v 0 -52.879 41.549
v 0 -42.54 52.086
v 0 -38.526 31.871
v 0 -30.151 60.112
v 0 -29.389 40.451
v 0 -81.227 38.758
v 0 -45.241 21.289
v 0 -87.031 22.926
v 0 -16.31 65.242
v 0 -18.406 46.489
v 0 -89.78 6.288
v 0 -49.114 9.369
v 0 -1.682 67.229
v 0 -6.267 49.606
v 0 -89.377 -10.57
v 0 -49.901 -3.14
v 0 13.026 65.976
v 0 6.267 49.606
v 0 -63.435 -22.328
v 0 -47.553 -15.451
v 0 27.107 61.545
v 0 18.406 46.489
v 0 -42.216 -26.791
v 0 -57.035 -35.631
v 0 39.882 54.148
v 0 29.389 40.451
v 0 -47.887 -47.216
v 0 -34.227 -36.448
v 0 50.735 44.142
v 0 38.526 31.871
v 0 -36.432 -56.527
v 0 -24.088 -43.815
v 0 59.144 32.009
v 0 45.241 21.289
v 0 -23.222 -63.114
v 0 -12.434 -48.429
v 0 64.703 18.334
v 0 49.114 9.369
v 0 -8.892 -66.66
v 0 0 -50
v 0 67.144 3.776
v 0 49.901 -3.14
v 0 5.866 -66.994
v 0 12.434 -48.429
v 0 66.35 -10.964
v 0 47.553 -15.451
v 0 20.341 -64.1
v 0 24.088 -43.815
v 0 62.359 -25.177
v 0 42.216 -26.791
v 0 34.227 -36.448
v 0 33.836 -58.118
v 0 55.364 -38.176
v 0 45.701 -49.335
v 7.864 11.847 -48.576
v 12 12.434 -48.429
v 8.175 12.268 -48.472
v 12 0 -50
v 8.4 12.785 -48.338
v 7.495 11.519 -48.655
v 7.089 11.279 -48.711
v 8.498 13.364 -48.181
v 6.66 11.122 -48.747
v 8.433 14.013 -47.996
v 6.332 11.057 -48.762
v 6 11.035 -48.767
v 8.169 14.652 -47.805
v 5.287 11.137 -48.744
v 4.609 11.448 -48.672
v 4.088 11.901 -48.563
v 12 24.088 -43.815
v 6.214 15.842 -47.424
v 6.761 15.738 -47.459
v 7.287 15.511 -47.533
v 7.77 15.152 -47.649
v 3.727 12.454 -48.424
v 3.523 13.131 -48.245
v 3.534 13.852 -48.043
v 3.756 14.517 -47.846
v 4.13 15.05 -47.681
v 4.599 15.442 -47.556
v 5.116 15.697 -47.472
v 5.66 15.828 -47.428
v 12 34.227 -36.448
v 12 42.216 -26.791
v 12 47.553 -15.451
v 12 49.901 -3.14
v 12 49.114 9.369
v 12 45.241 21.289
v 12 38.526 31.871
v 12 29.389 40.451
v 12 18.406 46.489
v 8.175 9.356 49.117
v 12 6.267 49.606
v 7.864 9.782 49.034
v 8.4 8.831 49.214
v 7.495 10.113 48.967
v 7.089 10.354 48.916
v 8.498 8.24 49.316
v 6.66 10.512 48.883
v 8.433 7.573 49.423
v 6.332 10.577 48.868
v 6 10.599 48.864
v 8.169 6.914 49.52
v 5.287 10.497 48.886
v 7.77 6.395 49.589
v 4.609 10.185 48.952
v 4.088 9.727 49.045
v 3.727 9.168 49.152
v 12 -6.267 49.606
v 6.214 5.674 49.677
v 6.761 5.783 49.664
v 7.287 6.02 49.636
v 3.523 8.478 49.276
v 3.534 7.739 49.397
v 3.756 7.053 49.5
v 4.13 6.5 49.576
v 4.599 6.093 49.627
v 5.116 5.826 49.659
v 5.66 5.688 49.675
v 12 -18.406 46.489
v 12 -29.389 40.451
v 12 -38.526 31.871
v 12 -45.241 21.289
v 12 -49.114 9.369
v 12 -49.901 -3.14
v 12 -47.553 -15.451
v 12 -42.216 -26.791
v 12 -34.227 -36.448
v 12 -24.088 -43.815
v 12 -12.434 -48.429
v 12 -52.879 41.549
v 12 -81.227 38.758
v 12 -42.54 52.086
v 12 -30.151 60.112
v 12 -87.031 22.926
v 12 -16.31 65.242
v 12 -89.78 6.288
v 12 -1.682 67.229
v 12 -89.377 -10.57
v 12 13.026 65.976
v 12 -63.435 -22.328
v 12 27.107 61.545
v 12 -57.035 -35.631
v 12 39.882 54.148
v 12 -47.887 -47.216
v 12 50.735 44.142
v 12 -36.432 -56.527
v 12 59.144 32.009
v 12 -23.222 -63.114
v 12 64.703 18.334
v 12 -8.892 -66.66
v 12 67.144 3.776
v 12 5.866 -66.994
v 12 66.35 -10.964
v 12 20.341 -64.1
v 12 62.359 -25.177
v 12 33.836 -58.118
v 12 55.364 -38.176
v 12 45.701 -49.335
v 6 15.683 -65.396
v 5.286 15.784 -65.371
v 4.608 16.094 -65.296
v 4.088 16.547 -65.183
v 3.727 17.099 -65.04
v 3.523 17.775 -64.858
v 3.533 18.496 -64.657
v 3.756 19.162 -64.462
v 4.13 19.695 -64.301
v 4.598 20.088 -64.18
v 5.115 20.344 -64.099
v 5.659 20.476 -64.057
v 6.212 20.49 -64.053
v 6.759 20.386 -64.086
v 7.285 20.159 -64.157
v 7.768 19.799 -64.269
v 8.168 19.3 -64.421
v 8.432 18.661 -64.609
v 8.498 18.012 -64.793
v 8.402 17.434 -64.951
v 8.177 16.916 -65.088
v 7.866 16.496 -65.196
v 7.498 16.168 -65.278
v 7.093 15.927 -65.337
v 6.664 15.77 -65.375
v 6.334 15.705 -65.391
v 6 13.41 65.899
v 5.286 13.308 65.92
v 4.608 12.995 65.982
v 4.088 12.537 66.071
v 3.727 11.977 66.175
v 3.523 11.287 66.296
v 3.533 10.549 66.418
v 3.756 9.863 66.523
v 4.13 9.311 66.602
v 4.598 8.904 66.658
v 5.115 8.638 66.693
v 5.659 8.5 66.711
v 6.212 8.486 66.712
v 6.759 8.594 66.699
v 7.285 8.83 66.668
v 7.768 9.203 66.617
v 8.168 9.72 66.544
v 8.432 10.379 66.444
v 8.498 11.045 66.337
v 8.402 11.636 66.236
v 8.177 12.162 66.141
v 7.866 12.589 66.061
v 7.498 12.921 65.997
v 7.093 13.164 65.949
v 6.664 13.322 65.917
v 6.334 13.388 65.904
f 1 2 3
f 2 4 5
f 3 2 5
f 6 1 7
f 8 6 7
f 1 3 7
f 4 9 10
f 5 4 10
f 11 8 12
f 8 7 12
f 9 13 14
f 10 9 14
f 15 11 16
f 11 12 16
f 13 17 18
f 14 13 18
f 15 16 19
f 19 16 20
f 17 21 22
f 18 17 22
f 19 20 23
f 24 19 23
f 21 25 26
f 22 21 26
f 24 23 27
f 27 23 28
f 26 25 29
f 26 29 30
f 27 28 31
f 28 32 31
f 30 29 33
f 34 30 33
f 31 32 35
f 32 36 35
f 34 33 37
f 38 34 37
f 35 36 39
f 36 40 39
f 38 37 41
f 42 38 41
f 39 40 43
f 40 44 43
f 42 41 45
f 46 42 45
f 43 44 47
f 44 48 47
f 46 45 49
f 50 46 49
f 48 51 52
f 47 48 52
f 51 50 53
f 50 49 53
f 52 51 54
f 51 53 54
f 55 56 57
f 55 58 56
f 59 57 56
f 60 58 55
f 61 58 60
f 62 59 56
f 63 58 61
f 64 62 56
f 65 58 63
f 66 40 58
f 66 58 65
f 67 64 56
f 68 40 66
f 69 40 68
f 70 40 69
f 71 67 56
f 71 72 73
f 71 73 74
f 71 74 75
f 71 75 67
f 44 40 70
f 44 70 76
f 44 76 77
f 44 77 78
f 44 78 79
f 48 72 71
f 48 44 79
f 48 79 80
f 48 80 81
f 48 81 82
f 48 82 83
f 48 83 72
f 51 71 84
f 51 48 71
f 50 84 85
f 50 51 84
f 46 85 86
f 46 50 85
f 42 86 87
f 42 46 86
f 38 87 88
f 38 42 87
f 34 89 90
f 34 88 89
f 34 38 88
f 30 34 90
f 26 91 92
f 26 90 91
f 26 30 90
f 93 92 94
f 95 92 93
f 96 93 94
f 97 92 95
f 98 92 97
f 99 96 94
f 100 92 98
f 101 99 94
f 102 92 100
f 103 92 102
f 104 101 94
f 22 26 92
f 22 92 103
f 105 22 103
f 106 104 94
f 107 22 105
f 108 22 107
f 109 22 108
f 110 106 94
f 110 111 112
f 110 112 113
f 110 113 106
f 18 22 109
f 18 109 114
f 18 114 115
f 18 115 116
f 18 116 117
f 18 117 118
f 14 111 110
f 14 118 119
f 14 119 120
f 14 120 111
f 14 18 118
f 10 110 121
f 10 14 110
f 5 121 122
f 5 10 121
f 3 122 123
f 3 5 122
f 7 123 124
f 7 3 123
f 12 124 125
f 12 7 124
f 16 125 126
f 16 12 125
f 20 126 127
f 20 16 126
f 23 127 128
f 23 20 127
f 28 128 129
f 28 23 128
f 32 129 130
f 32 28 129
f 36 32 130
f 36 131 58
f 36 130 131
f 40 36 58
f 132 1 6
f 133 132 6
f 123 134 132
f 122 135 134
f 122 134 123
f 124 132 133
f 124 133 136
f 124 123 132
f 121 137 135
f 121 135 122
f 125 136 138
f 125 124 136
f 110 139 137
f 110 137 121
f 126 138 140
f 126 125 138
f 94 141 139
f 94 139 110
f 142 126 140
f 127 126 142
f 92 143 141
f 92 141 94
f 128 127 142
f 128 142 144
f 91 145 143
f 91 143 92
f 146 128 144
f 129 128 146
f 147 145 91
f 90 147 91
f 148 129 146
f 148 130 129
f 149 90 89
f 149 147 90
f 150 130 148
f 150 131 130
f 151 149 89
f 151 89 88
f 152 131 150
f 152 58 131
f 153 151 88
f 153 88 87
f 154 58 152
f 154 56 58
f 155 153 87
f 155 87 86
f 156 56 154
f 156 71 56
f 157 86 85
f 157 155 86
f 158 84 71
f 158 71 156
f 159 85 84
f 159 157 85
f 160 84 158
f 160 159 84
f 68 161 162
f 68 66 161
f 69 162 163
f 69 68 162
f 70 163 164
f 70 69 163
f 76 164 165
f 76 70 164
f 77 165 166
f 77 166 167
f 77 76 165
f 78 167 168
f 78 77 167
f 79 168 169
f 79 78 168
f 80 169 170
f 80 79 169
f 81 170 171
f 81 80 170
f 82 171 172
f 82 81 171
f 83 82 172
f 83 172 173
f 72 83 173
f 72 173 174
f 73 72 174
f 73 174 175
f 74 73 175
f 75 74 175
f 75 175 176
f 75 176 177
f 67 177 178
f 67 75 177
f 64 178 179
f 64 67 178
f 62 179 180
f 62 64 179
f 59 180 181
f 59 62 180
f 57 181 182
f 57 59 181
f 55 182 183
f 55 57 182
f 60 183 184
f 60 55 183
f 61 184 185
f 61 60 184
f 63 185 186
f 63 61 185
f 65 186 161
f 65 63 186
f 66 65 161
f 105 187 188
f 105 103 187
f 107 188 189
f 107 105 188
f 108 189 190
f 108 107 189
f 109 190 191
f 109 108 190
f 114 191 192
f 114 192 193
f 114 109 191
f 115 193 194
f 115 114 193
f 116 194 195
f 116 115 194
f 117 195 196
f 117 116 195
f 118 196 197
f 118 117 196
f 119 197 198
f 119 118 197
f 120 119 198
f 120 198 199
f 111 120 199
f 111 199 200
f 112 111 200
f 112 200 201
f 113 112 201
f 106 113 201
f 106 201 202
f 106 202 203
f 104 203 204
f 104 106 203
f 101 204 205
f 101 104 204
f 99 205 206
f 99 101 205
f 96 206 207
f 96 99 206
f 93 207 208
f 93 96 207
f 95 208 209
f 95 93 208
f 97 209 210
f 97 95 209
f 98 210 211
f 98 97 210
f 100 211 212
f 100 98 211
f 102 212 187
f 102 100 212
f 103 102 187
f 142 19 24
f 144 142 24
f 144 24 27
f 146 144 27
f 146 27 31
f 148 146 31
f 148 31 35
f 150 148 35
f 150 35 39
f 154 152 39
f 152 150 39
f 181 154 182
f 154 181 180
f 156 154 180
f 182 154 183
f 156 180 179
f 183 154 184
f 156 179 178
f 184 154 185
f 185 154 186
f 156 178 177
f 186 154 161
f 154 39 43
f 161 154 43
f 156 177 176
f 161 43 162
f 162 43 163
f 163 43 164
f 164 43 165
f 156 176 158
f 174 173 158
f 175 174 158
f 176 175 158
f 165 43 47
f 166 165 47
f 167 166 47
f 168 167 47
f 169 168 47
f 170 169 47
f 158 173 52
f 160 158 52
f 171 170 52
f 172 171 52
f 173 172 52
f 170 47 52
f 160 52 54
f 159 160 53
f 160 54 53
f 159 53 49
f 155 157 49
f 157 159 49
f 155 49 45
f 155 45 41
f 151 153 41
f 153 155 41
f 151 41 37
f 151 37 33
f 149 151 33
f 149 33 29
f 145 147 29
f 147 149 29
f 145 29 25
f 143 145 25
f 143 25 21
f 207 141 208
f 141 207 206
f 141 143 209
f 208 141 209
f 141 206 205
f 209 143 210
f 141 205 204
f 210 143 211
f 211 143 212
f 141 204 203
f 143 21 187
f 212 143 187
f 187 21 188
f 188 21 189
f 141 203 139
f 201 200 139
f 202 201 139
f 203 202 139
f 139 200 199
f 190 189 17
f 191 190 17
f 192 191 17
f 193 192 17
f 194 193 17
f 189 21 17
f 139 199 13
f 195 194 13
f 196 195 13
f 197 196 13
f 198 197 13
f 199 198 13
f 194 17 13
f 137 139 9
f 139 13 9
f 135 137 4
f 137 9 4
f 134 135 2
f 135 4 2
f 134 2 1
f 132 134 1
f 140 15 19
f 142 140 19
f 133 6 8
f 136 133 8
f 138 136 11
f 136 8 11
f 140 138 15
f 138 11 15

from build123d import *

# Parameters (mm, degrees)
SKETCH_1_R               = 67.25
EXTRUDE_1_DEPTH          = 12
EXTRUDE_2_DEPTH          = 12
CUT_EXTRUDE_1_DEPTH      = 113.989214087
CUT_EXTRUDE_1_DEPTH_BACK = 113.989214087
SKETCH_3_R               = 50


with BuildPart() as part:
    # ｽｹｯﾁ1 → ﾎﾞｽ - 押し出し1 (new body)
    with BuildSketch(Plane(origin=(0, 0, 0), x_dir=(0, 0, -1), z_dir=(1, 0, 0))):
        Circle(SKETCH_1_R)
    extrude(amount=EXTRUDE_1_DEPTH)

    # ｽｹｯﾁ2 → ﾎﾞｽ - 押し出し2 (add)
    with BuildSketch(Plane(origin=(0, 0, 0), x_dir=(0, 0, -1), z_dir=(1, 0, 0))):
        with BuildLine():
            Line((-41.549382629, -52.879214282), (-38.758443712, -81.226738461))
            ThreePointArc((-38.758443712, -81.226738461), (-14.671715608, -88.796062757), (10.569667713, -89.37719018))
            Line((10.569667713, -89.37719018), (22.328272087, -63.435090964))
            Line((22.328272087, -63.435090964), (-41.549382629, -52.879214282))
        make_face()
    extrude(amount=EXTRUDE_2_DEPTH)

    # ｽｹｯﾁ3 → ｶｯﾄ - 押し出し1 (cut, two sides: drawn at the far end of the back side and taken through both)
    with BuildSketch(Plane(origin=(0, 0, 0), x_dir=(0, 0, -1), z_dir=(1, 0, 0)).offset(-CUT_EXTRUDE_1_DEPTH_BACK)):
        Circle(SKETCH_3_R)
    extrude(amount=CUT_EXTRUDE_1_DEPTH + CUT_EXTRUDE_1_DEPTH_BACK, mode=Mode.SUBTRACT)

    # ｽｹｯﾁ4 → ｶｯﾄ - 回転1 (revolve, cut)
    with BuildSketch(Plane(origin=(6, 0, 0), x_dir=(0, 0, -1), z_dir=(1, 0, 0)), mode=Mode.PRIVATE) as cut_revolve_1_sk:
        Polygon((-44.399328848, 7.328000946), (-73.998881413, 12.21333491), (-74.405992577, 9.74670553), (-44.806440011, 4.861371566), align=None)
    revolve(cut_revolve_1_sk.sketch.rotate(Axis((6, 0, 0), (0, 0.1628444654719115, 0.9866517521725523)), 180), axis=Axis((6, 0, 0), (0, 0.1628444654719115, 0.9866517521725523)), mode=Mode.SUBTRACT)

    # ｽｹｯﾁ5 → ｶｯﾄ - 回転2 (revolve, cut)
    with BuildSketch(Plane(origin=(6, 0, 0), x_dir=(0, 0, -1), z_dir=(1, 0, 0)), mode=Mode.PRIVATE) as cut_revolve_2_sk:
        Polygon((43.338895176, 12.113635497), (72.231491959, 20.189392495), (71.55851221, 22.597108894), (42.665915426, 14.521351896), align=None)
    revolve(cut_revolve_2_sk.sketch.rotate(Axis((6, 0, 0), (0, 0.2691918999319745, -0.9630865594592284)), 180), axis=Axis((6, 0, 0), (0, 0.2691918999319745, -0.9630865594592284)), mode=Mode.SUBTRACT)


solid = part.part
